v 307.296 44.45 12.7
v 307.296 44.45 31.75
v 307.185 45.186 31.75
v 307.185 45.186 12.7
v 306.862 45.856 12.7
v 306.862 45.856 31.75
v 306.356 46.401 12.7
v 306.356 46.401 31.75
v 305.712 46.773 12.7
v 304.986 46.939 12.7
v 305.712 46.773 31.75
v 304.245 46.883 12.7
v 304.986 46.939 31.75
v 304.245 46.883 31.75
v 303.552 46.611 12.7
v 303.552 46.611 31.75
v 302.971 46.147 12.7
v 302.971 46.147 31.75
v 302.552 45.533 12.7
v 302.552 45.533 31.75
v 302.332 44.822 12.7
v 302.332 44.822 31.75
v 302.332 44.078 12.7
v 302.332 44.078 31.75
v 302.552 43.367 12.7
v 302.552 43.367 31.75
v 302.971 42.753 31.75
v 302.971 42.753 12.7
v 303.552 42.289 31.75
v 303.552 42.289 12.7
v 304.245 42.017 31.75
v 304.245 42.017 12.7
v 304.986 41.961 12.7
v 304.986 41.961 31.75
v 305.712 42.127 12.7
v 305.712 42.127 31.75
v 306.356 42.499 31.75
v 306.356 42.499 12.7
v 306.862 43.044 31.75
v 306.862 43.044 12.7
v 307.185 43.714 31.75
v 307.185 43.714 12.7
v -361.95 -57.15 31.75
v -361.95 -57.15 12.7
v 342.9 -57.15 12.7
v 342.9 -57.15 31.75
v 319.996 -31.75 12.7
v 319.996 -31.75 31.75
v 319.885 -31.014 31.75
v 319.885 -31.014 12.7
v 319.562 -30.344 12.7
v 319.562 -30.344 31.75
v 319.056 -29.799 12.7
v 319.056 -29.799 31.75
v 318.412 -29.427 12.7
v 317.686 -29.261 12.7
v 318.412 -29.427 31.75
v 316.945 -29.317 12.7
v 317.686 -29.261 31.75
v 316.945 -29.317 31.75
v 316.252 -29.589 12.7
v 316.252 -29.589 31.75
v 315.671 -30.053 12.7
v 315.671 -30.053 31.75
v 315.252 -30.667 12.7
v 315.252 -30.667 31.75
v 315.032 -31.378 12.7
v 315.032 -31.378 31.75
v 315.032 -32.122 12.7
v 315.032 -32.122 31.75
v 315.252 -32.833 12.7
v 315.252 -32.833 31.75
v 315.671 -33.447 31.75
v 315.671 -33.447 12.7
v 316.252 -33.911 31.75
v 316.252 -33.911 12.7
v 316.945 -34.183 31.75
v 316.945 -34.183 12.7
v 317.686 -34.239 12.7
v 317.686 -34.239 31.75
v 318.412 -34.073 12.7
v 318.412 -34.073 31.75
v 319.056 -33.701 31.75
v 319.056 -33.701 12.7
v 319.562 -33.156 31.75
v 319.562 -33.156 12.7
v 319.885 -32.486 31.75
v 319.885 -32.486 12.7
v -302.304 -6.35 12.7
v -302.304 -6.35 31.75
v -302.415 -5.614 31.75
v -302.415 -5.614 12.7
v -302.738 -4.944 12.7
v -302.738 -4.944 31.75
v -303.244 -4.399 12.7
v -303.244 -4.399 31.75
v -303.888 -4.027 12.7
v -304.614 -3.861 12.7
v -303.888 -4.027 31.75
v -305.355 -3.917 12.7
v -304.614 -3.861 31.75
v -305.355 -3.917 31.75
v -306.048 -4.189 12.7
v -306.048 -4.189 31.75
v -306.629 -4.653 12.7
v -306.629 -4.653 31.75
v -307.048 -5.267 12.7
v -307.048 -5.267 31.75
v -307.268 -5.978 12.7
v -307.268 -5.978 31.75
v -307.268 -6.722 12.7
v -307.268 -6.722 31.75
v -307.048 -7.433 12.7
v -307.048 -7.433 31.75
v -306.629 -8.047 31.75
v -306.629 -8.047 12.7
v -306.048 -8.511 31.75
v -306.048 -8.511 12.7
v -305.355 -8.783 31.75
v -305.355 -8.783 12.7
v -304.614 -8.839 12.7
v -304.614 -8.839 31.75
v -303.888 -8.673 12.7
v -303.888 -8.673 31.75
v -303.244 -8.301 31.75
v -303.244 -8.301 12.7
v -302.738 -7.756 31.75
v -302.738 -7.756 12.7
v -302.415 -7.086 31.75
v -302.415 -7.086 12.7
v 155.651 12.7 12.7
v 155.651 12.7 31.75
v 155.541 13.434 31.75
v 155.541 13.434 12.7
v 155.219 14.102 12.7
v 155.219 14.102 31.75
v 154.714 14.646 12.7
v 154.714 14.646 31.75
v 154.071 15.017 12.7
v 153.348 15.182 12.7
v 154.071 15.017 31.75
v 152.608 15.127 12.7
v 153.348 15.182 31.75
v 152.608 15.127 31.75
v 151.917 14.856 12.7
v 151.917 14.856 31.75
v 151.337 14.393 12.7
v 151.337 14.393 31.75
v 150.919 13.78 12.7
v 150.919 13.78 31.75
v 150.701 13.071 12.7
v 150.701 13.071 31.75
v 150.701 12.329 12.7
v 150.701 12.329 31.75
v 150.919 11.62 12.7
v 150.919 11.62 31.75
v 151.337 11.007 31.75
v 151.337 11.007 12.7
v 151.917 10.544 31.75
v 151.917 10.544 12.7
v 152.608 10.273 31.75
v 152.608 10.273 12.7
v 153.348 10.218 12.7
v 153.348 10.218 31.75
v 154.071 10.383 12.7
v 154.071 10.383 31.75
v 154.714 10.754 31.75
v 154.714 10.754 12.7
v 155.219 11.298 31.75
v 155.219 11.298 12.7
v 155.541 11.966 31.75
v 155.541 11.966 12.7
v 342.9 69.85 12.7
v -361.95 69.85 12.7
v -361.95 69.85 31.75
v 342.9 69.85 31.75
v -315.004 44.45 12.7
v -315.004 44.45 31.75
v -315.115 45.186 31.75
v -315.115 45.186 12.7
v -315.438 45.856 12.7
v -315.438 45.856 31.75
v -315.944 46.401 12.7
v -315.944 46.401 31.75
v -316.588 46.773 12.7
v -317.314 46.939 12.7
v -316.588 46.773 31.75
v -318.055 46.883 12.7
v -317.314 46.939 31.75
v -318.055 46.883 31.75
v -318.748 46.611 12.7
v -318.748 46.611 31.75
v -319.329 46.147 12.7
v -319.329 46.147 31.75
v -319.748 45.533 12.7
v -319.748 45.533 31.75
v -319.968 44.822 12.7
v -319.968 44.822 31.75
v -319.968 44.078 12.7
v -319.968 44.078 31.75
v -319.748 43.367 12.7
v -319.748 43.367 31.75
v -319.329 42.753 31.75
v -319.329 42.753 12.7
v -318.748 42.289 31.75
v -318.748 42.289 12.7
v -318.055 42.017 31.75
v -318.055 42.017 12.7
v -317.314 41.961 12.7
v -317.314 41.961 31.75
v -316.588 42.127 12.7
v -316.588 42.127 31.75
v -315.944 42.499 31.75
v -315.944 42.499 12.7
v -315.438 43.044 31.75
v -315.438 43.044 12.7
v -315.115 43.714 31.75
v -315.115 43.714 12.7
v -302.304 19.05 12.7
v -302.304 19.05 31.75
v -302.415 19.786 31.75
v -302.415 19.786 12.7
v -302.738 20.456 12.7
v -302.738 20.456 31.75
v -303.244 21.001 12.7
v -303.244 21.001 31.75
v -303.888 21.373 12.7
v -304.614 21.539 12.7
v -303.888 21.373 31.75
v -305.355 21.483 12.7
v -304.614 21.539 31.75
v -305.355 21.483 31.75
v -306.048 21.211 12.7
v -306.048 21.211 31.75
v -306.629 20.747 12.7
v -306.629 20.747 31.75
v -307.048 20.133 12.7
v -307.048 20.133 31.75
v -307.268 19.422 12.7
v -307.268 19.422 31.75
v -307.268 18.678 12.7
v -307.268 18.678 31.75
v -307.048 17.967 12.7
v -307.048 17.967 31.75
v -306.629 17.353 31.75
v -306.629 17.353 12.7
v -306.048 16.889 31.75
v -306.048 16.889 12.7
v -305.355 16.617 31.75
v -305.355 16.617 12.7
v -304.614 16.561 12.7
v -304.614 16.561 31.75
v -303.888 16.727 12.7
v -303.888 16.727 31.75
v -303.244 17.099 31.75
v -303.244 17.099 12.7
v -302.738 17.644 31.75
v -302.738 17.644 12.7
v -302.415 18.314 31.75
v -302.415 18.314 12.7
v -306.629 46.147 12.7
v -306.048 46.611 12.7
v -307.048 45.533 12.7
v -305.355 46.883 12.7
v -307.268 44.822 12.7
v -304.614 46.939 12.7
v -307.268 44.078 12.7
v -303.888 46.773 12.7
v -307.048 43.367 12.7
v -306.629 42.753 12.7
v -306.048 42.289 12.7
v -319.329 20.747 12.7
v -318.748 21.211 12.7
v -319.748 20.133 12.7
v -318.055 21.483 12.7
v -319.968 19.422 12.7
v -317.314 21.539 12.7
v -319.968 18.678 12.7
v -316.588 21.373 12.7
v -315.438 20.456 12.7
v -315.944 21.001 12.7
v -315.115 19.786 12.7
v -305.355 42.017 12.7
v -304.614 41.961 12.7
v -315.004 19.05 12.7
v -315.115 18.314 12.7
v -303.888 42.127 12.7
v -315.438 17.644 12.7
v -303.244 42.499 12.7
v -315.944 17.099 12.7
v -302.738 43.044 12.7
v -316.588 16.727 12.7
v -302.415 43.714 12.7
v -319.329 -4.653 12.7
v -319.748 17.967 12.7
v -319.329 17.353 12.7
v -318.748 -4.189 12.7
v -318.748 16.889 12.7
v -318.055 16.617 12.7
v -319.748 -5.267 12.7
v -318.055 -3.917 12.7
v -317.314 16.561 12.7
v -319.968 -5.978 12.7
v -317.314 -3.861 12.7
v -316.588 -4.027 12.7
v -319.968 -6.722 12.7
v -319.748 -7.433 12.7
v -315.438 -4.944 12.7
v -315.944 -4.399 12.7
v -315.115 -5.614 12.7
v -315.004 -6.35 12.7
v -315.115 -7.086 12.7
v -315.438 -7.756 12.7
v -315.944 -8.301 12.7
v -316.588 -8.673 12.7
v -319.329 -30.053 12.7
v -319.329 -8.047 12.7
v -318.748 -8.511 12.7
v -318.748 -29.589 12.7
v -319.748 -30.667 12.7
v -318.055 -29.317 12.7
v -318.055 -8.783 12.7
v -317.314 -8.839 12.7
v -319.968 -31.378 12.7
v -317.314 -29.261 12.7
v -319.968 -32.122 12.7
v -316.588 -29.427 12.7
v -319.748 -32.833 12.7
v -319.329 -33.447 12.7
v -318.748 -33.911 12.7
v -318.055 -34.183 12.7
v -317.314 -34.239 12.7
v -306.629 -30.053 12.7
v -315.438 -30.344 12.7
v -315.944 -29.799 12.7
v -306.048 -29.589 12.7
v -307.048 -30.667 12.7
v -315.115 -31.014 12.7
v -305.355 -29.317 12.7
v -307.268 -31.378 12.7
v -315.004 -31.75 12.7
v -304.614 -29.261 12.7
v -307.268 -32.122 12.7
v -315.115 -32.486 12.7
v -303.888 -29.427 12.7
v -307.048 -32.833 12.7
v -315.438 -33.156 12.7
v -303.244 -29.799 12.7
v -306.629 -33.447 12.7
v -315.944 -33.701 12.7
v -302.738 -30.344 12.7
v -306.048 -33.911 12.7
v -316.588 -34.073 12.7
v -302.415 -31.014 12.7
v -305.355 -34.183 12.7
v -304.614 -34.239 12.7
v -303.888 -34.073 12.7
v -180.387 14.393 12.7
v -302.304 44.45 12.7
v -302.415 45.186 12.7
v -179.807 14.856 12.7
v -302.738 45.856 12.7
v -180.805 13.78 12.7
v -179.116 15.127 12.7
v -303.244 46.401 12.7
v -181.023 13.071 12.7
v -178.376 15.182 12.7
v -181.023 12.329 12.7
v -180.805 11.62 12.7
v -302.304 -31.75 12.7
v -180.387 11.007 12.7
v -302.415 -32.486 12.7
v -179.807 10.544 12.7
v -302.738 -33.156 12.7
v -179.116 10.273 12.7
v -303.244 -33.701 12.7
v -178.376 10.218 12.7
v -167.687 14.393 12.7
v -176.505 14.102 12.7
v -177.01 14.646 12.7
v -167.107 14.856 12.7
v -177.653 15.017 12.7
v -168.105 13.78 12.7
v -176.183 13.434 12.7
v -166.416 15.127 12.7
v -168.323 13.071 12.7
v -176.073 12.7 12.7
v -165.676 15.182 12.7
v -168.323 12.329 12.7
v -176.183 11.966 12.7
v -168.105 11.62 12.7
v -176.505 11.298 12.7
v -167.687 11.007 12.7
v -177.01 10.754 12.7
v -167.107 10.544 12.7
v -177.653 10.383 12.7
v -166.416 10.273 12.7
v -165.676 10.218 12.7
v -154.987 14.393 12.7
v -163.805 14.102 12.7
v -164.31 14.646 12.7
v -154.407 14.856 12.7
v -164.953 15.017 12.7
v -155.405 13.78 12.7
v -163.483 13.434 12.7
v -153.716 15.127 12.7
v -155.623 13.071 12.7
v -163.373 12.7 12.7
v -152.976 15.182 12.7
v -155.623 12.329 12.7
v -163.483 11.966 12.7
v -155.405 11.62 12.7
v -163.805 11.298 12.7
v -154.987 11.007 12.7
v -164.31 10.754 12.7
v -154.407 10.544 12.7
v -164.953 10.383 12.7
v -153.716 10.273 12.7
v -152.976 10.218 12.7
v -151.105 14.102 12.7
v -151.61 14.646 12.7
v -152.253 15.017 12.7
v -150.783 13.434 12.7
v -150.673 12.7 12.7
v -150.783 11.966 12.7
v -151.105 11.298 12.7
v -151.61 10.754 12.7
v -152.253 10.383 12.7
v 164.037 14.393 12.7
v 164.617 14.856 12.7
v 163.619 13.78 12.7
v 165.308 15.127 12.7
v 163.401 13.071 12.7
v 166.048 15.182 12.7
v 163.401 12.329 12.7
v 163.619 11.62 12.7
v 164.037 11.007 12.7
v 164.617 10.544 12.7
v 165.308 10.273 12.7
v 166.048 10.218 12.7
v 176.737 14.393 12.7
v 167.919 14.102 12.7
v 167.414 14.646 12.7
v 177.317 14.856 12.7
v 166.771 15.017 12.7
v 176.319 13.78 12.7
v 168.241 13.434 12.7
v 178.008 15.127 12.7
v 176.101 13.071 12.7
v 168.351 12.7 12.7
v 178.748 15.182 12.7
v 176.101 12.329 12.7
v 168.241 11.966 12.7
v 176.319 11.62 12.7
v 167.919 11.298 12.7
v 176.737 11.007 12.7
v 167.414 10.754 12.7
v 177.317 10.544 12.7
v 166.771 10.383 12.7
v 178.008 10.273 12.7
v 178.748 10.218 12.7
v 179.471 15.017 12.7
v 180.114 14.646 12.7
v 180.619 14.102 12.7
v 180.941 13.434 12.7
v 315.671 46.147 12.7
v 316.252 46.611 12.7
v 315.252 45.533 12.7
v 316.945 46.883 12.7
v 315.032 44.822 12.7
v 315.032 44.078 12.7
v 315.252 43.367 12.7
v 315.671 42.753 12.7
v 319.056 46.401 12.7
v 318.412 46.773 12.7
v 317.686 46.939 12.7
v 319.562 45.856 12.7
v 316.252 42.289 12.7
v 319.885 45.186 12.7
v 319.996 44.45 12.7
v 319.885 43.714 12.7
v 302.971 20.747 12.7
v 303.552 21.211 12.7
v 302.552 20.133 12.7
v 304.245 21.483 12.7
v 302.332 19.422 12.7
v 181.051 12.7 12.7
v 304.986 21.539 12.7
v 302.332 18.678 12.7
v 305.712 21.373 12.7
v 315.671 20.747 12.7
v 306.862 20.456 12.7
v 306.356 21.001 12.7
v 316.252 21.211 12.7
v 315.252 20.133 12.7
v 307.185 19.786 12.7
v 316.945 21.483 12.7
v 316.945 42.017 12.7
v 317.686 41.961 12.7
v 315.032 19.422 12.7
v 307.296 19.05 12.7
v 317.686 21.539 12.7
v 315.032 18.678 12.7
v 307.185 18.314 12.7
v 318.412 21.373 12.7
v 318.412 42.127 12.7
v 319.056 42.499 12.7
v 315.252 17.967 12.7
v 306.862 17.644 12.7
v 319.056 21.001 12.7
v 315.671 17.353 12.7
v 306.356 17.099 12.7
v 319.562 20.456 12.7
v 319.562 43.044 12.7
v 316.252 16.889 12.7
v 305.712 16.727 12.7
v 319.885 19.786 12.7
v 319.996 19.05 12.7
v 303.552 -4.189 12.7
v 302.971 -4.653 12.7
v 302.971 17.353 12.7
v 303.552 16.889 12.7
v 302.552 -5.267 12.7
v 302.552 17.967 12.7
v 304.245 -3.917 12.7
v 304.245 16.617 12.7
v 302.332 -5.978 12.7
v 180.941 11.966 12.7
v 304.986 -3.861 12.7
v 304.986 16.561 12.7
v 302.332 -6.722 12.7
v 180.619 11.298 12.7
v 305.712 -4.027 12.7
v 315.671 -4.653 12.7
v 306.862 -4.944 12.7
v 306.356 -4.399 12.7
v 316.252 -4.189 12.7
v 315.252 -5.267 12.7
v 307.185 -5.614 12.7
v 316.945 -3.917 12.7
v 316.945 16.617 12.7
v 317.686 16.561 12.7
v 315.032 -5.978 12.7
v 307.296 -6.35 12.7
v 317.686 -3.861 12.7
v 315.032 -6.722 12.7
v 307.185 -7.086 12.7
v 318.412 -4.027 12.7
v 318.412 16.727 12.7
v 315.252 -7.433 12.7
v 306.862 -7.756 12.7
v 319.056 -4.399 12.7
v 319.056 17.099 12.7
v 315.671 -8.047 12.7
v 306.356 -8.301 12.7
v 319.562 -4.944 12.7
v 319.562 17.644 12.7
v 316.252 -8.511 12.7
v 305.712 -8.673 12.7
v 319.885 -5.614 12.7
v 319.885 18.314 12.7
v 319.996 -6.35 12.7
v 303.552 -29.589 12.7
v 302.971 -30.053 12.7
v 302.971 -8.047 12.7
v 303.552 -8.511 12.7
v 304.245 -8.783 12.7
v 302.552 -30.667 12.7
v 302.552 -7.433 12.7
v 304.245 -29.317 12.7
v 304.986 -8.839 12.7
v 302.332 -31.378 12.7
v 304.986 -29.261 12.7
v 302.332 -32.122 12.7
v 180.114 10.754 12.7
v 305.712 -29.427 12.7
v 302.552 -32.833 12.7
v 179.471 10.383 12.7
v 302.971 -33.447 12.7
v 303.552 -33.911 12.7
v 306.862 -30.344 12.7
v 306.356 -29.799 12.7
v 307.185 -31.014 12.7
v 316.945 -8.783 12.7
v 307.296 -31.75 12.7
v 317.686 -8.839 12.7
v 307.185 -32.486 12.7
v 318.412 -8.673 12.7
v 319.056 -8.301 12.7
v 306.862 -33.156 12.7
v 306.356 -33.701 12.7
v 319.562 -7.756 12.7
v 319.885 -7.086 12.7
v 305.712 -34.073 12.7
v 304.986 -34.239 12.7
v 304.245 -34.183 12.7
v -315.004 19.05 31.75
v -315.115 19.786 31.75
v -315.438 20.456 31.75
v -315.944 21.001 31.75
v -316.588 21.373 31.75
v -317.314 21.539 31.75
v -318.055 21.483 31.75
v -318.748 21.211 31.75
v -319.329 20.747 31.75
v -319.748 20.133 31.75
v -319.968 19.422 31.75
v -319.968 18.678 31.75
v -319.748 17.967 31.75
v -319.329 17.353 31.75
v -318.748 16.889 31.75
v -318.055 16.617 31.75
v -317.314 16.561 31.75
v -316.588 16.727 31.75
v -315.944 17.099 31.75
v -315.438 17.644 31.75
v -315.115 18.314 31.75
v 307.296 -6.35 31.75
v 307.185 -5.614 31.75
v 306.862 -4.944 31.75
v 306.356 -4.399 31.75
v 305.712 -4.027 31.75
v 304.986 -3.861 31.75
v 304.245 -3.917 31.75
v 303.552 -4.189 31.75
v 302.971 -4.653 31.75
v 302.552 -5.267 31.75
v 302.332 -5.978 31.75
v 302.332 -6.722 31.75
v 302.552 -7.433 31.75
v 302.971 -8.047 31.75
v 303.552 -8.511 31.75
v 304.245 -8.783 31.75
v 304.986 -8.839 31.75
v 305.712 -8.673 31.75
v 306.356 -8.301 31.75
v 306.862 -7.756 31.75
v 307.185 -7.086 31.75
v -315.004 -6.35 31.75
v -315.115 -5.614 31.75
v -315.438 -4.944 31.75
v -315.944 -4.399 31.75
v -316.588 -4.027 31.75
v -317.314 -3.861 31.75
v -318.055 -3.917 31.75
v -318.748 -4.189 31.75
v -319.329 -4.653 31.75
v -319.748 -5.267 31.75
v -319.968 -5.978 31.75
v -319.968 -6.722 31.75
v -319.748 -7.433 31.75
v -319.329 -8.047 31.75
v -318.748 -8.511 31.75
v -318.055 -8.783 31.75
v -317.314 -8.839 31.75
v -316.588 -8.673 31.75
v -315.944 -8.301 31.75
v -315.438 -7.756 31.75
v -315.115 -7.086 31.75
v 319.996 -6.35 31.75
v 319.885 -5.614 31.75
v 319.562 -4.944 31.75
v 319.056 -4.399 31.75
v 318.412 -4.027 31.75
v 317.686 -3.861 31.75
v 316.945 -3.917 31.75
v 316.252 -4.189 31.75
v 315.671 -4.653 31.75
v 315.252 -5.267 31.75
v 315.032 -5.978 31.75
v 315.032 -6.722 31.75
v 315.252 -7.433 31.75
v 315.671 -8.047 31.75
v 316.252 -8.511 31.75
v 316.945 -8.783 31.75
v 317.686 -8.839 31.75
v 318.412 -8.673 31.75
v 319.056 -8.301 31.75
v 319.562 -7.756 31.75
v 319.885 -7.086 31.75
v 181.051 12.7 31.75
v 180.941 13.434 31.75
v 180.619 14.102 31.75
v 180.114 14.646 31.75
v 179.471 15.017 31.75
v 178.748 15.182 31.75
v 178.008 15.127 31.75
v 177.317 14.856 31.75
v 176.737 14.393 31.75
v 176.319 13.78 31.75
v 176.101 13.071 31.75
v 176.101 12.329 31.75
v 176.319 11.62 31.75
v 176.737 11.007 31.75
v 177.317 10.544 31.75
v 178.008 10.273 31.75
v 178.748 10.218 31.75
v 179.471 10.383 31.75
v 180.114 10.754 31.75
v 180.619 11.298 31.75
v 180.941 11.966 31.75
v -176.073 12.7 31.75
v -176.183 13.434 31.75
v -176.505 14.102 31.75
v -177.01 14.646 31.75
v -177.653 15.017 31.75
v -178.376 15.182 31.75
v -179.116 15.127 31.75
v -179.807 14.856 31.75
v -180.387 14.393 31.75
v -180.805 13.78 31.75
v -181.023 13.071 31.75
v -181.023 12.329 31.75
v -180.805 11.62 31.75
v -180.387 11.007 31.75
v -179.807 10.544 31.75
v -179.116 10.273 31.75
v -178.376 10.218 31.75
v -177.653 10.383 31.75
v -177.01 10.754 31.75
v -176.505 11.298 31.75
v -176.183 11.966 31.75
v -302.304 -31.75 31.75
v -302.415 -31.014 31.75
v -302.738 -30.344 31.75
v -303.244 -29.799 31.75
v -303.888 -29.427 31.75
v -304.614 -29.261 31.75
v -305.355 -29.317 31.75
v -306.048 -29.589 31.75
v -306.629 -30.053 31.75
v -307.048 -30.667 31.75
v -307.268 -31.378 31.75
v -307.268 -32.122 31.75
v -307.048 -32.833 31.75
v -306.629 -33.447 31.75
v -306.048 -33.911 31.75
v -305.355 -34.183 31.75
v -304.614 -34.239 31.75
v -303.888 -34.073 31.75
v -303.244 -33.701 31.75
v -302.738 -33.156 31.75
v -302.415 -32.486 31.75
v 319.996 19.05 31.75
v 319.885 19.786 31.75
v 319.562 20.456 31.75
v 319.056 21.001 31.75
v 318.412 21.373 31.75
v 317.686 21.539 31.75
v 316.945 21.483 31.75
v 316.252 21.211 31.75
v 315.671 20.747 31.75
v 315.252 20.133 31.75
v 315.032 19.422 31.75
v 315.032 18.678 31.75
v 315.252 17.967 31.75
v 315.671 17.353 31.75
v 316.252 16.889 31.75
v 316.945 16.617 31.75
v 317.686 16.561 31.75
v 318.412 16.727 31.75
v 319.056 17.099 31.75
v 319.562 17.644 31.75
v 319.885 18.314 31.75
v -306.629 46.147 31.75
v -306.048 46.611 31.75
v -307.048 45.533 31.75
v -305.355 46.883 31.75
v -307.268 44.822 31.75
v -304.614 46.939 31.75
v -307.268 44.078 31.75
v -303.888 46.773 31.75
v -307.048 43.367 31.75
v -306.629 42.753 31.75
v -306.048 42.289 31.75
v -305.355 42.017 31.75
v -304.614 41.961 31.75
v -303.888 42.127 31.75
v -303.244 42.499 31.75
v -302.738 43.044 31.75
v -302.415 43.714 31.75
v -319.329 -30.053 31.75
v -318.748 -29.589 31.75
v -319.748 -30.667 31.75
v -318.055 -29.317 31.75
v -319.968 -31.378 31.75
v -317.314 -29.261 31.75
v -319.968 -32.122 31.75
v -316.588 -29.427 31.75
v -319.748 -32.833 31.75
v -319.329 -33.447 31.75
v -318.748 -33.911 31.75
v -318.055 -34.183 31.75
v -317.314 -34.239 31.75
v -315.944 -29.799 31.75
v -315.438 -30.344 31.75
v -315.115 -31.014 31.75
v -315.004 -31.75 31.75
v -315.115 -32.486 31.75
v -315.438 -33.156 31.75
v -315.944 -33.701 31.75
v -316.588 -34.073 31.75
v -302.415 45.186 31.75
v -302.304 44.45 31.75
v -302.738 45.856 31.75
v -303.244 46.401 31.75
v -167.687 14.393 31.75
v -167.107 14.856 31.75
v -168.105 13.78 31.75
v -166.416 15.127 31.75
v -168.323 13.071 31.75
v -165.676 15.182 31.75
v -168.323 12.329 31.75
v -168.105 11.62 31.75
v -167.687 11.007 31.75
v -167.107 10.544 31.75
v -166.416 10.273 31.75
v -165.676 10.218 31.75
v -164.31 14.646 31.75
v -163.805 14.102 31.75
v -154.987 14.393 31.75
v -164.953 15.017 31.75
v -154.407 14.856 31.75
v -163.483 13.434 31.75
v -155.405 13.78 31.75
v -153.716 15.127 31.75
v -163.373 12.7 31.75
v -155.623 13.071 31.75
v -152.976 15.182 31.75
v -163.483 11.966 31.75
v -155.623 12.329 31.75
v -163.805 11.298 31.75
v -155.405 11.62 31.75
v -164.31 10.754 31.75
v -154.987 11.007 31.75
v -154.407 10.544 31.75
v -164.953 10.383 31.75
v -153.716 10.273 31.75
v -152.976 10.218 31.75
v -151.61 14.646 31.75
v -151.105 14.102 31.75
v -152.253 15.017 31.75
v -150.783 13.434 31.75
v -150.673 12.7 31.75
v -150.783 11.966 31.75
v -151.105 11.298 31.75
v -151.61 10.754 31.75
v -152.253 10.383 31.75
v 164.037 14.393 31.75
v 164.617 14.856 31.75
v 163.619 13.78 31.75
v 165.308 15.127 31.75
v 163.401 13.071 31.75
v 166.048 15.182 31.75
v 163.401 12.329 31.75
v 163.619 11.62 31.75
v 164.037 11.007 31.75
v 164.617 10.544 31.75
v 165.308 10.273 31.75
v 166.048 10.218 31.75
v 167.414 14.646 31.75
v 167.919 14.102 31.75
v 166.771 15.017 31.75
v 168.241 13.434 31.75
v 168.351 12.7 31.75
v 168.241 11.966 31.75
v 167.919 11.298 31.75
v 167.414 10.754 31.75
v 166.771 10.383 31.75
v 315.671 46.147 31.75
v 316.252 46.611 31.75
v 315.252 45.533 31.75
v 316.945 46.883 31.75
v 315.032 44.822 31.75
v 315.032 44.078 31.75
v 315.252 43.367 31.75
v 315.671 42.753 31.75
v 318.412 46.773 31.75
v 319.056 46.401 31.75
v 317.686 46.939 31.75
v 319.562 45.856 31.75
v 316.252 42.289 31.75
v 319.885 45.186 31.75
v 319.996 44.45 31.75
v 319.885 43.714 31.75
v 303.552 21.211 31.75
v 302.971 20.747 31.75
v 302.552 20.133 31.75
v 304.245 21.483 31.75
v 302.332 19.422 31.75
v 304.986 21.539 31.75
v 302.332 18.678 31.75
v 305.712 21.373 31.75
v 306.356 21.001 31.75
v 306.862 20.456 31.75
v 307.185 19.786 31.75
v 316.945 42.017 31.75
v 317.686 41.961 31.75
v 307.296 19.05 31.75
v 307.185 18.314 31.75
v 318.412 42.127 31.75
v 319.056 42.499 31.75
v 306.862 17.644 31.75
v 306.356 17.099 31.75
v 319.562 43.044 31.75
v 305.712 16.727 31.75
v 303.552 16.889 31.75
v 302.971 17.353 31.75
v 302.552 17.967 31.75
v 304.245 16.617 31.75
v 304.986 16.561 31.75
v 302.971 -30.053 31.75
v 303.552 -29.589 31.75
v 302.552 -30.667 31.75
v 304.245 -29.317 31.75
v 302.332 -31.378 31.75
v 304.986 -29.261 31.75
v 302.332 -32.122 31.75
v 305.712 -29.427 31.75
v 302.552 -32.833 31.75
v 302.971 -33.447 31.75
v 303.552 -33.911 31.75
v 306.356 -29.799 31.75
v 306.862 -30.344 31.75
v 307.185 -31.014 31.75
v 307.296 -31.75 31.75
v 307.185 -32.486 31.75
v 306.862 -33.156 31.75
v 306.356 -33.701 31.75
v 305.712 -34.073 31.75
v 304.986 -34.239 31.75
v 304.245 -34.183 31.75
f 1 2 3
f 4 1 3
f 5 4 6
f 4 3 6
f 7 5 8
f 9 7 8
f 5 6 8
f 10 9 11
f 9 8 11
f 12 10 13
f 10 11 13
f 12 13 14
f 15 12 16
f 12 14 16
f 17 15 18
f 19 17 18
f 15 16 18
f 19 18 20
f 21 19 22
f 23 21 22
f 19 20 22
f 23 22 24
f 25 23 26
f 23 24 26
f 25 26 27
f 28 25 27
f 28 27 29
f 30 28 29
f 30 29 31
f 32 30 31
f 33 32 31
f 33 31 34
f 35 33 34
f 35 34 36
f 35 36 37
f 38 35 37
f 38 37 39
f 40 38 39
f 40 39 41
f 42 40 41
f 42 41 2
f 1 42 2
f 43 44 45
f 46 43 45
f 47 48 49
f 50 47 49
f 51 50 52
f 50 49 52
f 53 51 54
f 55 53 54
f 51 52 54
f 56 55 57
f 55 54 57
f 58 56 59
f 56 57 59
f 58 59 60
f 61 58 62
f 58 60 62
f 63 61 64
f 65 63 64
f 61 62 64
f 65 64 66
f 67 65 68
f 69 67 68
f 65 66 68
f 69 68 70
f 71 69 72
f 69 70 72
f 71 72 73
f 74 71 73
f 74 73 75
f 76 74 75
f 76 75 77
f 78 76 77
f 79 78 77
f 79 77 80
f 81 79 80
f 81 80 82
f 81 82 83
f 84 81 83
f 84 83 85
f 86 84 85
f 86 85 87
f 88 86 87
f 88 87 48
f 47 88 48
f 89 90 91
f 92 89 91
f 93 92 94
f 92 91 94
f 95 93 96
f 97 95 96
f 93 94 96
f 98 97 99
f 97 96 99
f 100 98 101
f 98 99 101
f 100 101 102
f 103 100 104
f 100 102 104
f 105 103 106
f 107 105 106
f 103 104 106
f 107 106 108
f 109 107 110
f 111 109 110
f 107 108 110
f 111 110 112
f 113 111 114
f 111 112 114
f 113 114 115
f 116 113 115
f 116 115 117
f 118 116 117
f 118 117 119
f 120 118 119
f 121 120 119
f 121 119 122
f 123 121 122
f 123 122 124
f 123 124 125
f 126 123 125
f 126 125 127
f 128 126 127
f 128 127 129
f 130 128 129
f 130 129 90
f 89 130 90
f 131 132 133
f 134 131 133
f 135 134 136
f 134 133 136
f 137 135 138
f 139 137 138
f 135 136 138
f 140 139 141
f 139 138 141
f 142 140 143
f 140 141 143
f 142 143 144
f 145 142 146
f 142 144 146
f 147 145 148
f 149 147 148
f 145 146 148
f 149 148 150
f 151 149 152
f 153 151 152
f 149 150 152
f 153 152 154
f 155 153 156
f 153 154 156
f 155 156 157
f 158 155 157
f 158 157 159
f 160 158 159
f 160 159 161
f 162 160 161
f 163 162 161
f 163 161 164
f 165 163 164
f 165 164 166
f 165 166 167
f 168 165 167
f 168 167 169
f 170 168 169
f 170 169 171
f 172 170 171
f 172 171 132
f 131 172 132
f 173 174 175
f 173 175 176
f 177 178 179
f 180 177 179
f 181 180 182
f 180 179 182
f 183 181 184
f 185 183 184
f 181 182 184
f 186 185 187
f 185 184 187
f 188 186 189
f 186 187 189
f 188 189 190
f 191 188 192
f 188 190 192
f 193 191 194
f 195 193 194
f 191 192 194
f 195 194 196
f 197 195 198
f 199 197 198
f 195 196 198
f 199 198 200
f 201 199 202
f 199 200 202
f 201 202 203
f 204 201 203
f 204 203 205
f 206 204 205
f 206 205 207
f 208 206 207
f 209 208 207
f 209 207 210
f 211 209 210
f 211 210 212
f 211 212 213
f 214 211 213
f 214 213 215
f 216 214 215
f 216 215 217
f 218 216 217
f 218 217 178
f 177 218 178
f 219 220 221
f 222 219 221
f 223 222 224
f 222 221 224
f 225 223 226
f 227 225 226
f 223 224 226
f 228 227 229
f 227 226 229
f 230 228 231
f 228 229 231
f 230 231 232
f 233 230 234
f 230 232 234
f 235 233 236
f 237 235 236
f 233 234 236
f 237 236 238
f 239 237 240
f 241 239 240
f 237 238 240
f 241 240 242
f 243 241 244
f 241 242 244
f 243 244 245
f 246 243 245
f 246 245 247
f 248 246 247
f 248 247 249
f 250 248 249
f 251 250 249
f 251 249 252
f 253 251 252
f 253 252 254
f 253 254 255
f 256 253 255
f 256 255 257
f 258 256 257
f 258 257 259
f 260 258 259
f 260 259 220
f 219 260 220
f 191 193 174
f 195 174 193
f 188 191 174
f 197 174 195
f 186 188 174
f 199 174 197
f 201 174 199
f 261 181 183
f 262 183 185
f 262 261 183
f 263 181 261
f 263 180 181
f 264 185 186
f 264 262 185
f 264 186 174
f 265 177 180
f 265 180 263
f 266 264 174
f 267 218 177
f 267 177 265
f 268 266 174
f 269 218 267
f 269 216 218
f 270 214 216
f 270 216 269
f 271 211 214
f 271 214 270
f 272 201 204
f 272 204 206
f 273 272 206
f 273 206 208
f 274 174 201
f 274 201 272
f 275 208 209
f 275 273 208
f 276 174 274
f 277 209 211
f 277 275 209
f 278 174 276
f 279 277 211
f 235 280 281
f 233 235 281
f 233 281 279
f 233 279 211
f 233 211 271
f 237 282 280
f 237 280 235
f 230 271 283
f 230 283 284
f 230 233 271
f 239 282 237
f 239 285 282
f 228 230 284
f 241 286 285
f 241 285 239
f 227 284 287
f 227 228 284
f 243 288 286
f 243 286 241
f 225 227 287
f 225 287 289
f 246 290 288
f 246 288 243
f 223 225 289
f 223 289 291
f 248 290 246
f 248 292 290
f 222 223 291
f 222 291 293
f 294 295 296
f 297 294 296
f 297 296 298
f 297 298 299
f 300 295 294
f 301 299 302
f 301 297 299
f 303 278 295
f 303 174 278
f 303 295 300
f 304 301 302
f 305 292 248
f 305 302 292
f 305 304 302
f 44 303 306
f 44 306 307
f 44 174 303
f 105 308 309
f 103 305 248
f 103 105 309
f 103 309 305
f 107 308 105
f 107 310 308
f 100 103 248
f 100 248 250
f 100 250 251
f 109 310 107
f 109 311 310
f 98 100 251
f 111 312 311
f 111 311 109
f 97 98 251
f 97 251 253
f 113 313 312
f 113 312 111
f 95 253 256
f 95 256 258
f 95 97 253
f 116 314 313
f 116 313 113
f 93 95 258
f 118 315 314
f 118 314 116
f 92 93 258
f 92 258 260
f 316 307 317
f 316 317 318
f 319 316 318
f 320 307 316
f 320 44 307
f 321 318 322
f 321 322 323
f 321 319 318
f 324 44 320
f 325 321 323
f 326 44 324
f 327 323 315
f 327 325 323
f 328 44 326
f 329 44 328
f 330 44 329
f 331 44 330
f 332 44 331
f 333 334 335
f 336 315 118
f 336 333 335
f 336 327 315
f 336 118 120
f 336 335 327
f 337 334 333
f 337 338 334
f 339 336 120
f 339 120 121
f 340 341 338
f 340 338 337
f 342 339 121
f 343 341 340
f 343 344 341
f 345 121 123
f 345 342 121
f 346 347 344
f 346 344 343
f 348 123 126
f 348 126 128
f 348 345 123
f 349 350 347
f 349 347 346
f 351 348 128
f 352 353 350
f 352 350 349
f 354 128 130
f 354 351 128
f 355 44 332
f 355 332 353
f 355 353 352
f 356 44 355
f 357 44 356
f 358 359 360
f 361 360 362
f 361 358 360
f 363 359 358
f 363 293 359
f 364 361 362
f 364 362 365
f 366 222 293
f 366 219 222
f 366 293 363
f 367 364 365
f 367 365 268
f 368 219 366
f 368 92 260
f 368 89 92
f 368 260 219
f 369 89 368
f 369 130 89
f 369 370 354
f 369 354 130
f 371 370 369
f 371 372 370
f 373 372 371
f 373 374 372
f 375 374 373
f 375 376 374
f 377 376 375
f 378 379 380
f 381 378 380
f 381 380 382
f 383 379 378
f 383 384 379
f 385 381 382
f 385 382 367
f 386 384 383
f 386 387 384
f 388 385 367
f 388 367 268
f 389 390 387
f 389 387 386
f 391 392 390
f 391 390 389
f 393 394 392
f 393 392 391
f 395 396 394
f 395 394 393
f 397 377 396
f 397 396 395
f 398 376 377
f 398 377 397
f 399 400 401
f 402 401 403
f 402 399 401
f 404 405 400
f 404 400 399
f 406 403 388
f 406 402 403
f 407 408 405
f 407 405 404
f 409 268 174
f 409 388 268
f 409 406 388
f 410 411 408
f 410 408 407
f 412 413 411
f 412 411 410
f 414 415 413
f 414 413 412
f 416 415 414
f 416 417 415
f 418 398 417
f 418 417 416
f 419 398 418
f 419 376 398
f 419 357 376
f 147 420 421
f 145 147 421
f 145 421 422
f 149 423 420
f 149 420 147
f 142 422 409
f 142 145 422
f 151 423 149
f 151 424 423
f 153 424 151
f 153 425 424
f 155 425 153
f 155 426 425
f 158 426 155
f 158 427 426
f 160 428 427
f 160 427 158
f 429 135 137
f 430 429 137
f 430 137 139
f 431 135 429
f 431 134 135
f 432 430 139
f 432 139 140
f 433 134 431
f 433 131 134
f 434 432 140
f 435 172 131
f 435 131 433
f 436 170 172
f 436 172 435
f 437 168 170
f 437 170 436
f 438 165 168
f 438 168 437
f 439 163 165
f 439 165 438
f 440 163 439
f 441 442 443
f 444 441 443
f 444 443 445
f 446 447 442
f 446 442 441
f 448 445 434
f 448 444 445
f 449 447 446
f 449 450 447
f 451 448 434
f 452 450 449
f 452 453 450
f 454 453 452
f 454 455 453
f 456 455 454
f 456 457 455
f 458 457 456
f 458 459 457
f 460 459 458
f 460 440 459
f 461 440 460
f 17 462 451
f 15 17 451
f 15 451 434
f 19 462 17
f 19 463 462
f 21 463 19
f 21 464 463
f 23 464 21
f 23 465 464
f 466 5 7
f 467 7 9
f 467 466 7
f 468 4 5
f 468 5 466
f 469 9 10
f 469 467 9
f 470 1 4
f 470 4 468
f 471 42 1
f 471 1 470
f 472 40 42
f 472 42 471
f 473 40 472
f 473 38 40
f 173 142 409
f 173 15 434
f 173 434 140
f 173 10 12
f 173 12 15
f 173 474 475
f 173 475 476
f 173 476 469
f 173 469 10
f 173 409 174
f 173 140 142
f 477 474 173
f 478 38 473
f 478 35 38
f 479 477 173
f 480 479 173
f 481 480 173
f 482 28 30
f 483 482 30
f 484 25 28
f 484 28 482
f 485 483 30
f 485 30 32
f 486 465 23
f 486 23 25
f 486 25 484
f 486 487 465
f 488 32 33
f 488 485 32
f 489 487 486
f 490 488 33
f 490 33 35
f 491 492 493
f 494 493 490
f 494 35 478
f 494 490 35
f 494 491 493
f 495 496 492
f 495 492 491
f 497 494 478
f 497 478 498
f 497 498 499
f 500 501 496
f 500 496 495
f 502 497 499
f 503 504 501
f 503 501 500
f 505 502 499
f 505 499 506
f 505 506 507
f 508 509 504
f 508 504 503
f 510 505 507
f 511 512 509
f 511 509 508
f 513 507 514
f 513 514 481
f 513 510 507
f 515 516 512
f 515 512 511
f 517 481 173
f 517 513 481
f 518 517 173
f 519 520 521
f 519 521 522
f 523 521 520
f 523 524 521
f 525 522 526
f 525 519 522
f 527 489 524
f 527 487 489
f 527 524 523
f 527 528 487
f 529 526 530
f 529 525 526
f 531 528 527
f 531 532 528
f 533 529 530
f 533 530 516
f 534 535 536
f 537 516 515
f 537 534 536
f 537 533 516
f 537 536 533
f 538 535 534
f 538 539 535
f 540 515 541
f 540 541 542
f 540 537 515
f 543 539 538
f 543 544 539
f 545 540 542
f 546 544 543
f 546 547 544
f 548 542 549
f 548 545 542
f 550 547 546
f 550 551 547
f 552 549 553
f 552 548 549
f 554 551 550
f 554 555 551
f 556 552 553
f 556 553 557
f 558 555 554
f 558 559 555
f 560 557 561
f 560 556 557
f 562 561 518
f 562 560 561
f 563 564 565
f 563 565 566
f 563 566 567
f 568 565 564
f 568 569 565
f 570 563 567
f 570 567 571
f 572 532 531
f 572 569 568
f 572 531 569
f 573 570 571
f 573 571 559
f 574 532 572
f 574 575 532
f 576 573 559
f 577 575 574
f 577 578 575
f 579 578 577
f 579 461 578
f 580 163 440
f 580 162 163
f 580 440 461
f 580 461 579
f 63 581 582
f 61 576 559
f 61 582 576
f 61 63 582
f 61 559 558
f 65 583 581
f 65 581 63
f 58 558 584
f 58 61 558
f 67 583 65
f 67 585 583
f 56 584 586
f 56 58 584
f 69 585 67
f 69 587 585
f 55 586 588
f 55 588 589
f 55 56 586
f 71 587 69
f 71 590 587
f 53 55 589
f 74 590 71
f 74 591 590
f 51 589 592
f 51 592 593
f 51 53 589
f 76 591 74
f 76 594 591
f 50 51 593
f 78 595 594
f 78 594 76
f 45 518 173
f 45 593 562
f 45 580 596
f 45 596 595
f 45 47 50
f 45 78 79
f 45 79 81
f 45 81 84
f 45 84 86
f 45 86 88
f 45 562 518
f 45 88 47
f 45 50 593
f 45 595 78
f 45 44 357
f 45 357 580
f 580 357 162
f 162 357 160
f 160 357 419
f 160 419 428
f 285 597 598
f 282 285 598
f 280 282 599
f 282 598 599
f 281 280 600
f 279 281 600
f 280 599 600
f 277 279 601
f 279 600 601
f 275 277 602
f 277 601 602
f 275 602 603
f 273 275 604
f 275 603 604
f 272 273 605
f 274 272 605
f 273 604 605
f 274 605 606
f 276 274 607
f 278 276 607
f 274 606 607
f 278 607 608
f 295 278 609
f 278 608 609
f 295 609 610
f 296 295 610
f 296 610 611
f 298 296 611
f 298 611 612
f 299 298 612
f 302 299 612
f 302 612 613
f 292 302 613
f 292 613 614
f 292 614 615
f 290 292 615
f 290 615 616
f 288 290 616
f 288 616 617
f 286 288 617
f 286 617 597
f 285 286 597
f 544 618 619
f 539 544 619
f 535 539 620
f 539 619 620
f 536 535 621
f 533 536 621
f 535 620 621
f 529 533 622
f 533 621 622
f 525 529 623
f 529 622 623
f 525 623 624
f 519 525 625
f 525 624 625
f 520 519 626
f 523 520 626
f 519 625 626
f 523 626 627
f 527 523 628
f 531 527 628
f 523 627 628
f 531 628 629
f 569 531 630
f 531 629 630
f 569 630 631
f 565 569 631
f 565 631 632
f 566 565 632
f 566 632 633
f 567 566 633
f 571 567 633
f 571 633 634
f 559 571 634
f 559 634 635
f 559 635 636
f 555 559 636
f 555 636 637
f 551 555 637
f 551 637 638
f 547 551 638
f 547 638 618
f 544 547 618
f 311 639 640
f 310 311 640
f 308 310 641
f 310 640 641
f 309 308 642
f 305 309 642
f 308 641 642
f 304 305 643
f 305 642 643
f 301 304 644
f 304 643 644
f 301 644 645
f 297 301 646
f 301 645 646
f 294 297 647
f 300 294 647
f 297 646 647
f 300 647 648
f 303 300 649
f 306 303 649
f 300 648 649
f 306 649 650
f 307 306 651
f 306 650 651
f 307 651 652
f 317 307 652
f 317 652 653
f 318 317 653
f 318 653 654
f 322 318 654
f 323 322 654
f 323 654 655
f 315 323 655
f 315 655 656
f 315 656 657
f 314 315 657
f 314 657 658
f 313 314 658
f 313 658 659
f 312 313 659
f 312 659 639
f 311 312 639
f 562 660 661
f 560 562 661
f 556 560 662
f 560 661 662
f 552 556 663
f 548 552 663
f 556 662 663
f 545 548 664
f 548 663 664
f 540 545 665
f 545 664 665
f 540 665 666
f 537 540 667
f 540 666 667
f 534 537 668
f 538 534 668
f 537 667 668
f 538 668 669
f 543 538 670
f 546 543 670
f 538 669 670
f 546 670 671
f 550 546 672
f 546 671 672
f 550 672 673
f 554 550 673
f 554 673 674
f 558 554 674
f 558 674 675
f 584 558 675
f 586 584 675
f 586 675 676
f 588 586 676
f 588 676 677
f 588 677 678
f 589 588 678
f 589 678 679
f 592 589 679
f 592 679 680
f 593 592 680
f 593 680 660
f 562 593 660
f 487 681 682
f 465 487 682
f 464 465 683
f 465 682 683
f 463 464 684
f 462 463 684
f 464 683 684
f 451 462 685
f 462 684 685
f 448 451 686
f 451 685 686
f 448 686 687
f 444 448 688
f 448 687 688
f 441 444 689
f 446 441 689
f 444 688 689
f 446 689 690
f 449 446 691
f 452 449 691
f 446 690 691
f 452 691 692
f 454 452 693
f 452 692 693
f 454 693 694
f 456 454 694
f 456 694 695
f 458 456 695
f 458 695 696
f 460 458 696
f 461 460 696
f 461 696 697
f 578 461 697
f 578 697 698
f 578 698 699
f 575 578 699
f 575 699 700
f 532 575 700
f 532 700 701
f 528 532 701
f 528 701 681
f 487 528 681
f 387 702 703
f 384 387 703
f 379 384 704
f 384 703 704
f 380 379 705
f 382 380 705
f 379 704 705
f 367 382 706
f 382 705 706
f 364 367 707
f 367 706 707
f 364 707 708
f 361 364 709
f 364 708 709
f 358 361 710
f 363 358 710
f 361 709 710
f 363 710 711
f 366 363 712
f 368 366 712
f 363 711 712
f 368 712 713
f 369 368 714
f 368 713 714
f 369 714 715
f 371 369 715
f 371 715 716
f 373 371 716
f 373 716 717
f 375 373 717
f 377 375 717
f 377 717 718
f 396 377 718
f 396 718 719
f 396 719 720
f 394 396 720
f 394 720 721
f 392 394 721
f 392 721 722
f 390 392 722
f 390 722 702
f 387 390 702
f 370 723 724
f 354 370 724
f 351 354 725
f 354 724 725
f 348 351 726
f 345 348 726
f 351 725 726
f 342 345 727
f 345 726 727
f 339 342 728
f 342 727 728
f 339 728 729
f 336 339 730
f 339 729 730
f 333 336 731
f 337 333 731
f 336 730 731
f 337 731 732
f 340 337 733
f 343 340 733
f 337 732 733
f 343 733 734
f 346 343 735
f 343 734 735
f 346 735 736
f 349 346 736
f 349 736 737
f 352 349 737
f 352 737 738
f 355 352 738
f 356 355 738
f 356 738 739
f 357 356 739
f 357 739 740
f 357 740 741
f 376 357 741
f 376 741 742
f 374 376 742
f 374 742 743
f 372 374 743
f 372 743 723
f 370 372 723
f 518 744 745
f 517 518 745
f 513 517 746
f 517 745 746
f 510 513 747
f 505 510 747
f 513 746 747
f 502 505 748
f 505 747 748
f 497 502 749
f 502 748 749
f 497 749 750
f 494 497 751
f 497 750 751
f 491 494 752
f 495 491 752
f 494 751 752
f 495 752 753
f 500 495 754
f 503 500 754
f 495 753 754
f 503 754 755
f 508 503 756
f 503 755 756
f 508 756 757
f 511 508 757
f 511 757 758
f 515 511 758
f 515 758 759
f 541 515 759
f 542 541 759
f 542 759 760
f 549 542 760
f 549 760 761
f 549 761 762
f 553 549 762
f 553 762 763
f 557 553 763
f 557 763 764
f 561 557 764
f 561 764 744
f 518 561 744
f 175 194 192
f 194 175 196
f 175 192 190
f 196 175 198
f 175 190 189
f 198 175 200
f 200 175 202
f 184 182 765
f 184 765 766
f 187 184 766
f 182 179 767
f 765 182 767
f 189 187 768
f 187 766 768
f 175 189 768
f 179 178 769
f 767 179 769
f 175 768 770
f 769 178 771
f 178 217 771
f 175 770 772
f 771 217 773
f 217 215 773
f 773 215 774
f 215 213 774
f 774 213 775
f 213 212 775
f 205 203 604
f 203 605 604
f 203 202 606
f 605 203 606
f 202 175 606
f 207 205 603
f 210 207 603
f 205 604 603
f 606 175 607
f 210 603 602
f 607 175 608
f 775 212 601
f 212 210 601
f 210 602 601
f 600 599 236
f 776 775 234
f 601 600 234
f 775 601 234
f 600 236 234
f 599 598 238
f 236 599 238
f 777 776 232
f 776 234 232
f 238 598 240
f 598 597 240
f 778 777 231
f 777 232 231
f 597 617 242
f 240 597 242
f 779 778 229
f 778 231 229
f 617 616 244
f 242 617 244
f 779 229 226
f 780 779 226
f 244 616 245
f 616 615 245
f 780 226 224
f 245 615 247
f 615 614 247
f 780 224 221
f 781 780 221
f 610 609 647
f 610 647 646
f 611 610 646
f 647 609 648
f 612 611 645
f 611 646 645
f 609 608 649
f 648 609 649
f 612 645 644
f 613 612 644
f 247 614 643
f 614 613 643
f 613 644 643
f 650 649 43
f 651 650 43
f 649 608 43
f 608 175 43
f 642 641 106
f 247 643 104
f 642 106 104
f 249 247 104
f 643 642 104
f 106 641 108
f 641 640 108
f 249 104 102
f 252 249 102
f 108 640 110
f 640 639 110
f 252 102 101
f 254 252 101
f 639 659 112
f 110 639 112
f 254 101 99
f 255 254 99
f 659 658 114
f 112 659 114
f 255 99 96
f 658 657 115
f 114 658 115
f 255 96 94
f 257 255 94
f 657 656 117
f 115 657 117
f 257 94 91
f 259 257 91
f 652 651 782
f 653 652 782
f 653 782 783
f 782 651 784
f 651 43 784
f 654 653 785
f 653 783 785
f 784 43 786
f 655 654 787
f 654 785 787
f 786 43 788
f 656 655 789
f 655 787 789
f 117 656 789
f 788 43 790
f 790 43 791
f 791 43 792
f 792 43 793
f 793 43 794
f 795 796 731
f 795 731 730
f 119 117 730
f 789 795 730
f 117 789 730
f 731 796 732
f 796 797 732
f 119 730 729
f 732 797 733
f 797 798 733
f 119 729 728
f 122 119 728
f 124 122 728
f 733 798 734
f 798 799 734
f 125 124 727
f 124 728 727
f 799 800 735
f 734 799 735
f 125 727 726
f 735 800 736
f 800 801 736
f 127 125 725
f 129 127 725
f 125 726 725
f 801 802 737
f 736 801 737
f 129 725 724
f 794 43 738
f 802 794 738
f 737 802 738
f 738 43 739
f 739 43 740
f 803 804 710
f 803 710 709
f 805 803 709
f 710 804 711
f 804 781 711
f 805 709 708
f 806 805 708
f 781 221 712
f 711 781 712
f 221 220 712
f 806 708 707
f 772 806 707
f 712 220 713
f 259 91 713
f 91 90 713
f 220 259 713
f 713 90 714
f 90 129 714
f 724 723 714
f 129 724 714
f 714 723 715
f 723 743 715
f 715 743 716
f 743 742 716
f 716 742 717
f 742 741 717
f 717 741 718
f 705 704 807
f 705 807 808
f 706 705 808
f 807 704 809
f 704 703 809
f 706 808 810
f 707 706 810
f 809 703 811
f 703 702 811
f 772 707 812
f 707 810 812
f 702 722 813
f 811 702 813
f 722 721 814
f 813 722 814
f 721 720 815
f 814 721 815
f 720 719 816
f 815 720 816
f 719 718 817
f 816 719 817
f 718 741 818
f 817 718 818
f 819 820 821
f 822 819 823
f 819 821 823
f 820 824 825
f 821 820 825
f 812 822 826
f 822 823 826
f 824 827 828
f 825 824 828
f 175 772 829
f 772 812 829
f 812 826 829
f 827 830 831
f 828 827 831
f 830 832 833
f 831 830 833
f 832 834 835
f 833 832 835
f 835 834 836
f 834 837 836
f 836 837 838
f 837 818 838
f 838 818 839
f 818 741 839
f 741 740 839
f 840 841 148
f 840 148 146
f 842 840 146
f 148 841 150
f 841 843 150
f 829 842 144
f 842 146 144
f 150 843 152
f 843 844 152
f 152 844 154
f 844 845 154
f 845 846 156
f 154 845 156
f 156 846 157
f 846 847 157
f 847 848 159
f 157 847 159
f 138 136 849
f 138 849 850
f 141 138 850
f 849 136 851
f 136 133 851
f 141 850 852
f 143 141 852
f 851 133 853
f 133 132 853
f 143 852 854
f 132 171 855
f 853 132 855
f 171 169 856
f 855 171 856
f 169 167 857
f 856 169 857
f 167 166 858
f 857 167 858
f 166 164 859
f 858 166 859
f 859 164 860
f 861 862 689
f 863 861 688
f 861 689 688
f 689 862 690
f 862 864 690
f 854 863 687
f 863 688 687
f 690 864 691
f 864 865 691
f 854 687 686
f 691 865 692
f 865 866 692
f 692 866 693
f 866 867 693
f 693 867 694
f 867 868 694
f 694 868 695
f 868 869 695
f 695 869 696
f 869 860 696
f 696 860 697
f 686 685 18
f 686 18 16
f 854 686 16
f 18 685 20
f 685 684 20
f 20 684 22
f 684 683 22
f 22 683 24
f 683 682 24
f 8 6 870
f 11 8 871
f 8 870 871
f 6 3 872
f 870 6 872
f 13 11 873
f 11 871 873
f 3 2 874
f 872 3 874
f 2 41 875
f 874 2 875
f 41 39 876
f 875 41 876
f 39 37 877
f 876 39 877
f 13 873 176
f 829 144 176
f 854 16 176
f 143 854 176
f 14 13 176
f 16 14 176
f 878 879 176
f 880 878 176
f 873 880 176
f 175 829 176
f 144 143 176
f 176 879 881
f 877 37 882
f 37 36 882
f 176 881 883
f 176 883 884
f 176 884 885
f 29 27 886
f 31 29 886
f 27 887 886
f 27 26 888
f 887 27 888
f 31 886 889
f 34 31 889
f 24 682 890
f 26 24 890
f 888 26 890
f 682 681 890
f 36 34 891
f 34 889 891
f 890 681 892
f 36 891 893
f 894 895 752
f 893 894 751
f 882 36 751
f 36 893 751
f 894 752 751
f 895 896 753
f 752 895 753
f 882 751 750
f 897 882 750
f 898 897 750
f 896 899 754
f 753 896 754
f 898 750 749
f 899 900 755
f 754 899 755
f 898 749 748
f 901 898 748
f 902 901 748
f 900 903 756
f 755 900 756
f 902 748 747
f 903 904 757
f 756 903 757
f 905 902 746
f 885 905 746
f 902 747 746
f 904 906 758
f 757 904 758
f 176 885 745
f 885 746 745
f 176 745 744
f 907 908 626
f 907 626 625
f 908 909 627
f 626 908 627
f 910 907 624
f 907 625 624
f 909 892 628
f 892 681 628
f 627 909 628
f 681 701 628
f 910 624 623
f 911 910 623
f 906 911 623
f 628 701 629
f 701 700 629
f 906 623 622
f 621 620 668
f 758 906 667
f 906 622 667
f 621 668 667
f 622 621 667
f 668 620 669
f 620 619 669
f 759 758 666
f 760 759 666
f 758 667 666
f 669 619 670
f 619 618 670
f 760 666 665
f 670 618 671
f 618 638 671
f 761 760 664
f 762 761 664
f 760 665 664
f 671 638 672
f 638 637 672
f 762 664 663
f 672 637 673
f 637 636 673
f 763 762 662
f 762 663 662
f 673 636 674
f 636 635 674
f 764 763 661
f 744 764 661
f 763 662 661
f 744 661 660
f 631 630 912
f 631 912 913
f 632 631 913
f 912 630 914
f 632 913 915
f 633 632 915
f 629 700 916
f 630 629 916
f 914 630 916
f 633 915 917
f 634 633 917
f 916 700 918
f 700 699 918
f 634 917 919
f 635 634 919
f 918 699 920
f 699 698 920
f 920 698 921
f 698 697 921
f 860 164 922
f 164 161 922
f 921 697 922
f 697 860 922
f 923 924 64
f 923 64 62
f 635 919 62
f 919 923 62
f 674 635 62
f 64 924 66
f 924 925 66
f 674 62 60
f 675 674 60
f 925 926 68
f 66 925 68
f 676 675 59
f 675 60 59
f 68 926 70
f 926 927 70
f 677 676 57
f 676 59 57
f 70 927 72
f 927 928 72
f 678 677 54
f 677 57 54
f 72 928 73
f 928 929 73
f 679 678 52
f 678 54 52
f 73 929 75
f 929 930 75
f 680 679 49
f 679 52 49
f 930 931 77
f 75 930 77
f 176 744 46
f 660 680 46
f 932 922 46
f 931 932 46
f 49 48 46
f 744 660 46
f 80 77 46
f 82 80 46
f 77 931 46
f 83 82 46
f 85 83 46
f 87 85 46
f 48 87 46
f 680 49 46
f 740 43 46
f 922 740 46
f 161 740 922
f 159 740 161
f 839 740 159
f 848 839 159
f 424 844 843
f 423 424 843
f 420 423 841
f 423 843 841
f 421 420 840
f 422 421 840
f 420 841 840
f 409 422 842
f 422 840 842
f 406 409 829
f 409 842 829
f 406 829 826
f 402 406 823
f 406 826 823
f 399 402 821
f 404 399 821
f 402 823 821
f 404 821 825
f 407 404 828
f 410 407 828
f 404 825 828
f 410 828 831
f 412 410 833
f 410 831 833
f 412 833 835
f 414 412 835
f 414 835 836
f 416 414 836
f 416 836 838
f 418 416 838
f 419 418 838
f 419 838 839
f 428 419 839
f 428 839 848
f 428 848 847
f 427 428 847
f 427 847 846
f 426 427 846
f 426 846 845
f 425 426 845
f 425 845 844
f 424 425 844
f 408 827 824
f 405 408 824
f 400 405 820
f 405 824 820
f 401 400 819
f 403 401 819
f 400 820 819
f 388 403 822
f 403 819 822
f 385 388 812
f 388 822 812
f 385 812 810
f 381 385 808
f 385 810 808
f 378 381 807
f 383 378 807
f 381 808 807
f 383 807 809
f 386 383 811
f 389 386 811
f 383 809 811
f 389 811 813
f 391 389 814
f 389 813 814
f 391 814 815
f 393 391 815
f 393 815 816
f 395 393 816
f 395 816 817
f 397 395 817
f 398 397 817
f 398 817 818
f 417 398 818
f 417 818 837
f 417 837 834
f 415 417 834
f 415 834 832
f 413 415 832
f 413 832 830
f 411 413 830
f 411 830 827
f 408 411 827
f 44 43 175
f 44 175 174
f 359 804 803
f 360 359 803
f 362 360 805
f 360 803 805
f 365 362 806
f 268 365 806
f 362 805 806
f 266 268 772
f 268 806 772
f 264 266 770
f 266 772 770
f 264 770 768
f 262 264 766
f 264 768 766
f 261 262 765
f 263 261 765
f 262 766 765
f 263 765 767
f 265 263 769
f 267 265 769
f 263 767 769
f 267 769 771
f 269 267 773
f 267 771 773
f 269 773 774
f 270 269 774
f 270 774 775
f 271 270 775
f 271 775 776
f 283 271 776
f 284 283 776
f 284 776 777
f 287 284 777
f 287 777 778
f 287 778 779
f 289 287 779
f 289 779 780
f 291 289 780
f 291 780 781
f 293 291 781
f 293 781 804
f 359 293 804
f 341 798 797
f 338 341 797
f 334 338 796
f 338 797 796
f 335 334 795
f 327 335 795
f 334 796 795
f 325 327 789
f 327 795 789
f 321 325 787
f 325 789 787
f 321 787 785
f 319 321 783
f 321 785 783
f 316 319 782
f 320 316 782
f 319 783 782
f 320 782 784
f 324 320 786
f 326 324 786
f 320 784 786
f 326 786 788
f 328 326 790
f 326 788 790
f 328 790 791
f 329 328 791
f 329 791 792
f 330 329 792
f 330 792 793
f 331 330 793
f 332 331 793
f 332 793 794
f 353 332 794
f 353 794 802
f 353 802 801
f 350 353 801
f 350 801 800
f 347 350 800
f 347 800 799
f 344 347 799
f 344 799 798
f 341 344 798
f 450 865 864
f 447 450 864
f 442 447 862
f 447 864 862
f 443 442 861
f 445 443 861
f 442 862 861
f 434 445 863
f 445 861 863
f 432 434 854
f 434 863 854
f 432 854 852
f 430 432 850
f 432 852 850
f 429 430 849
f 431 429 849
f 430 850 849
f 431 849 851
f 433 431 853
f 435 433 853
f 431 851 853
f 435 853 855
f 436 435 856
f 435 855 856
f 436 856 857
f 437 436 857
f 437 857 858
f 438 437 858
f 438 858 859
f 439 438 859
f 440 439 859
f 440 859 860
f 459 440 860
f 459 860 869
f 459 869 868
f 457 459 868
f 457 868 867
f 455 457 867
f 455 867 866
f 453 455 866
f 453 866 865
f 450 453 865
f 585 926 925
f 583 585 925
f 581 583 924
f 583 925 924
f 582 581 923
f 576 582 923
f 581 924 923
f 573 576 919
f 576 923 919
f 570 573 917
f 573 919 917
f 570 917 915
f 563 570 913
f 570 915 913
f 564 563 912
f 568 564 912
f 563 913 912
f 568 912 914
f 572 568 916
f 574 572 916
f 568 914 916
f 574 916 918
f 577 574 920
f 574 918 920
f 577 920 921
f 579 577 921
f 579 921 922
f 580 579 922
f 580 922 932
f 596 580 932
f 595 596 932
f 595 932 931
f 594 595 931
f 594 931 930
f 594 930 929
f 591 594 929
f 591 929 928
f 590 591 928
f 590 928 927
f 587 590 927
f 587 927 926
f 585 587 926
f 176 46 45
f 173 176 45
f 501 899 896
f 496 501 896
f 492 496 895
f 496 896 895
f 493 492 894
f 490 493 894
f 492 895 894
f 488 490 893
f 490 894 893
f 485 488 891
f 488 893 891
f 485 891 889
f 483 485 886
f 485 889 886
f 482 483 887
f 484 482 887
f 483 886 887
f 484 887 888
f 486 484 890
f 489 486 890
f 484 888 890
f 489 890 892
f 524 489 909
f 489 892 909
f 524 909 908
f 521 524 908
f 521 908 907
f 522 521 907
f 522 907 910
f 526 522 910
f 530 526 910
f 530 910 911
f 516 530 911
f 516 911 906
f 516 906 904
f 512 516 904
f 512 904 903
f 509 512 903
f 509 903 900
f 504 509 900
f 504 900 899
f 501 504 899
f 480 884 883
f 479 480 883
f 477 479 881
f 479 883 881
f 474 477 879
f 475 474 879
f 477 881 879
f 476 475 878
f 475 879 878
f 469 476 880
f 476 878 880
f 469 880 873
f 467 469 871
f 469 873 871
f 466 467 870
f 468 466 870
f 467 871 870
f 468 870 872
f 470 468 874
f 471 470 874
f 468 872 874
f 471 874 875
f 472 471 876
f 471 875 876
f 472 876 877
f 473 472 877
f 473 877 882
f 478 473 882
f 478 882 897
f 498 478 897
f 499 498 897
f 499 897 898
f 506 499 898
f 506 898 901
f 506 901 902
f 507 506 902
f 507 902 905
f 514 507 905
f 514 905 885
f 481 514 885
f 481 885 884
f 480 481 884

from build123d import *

# Parameters (mm, degrees)
BOSS_EXTRUDE1_START = -57.15
SKETCH4_W           = 704.85
SKETCH4_H           = 19.05
BOSS_EXTRUDE1_DEPTH = 127
SKETCH5_R           = 2.49555
SKETCH5_R_2         = 2.4892
CUT_EXTRUDE1_DEPTH  = 20.05


with BuildPart() as part:
    # Sketch4 → Boss-Extrude1 (new body)
    with BuildSketch(Plane(origin=(0, 0, 0), x_dir=(1, 0, 0), z_dir=(0, 1, 0)).offset(BOSS_EXTRUDE1_START)):
        with Locations((-9.525, -22.225)):
            Rectangle(SKETCH4_W, SKETCH4_H)
    extrude(amount=BOSS_EXTRUDE1_DEPTH)

    # Sketch5 → Cut-Extrude1 (cut, through all)
    with BuildSketch(Plane.XY.offset(31.75)):
        with Locations((-317.5, 44.45)):
            Circle(SKETCH5_R)
        with Locations((-304.8, 44.45)):
            Circle(SKETCH5_R)
        with Locations((-317.5, 19.05)):
            Circle(SKETCH5_R)
        with Locations((-304.8, 19.05)):
            Circle(SKETCH5_R)
        with Locations((-317.5, -6.35)):
            Circle(SKETCH5_R)
        with Locations((-304.8, -6.35)):
            Circle(SKETCH5_R)
        with Locations((-317.5, -31.75)):
            Circle(SKETCH5_R)
        with Locations((-304.8, -31.75)):
            Circle(SKETCH5_R)
        with Locations((304.8, 44.45)):
            Circle(SKETCH5_R)
        with Locations((317.5, 44.45)):
            Circle(SKETCH5_R)
        with Locations((-178.562, 12.7)):
            Circle(SKETCH5_R_2)
        with Locations((-165.862, 12.7)):
            Circle(SKETCH5_R_2)
        with Locations((-153.162, 12.7)):
            Circle(SKETCH5_R_2)
        with Locations((153.162, 12.7)):
            Circle(SKETCH5_R_2)
        with Locations((165.862, 12.7)):
            Circle(SKETCH5_R_2)
        with Locations((178.562, 12.7)):
            Circle(SKETCH5_R_2)
        with Locations((317.5, 19.05)):
            Circle(SKETCH5_R)
        with Locations((304.8, 19.05)):
            Circle(SKETCH5_R)
        with Locations((317.5, -6.35)):
            Circle(SKETCH5_R)
        with Locations((304.8, -6.35)):
            Circle(SKETCH5_R)
        with Locations((317.5, -31.75)):
            Circle(SKETCH5_R)
        with Locations((304.8, -31.75)):
            Circle(SKETCH5_R)
    extrude(amount=-CUT_EXTRUDE1_DEPTH, mode=Mode.SUBTRACT)


solid = part.part
